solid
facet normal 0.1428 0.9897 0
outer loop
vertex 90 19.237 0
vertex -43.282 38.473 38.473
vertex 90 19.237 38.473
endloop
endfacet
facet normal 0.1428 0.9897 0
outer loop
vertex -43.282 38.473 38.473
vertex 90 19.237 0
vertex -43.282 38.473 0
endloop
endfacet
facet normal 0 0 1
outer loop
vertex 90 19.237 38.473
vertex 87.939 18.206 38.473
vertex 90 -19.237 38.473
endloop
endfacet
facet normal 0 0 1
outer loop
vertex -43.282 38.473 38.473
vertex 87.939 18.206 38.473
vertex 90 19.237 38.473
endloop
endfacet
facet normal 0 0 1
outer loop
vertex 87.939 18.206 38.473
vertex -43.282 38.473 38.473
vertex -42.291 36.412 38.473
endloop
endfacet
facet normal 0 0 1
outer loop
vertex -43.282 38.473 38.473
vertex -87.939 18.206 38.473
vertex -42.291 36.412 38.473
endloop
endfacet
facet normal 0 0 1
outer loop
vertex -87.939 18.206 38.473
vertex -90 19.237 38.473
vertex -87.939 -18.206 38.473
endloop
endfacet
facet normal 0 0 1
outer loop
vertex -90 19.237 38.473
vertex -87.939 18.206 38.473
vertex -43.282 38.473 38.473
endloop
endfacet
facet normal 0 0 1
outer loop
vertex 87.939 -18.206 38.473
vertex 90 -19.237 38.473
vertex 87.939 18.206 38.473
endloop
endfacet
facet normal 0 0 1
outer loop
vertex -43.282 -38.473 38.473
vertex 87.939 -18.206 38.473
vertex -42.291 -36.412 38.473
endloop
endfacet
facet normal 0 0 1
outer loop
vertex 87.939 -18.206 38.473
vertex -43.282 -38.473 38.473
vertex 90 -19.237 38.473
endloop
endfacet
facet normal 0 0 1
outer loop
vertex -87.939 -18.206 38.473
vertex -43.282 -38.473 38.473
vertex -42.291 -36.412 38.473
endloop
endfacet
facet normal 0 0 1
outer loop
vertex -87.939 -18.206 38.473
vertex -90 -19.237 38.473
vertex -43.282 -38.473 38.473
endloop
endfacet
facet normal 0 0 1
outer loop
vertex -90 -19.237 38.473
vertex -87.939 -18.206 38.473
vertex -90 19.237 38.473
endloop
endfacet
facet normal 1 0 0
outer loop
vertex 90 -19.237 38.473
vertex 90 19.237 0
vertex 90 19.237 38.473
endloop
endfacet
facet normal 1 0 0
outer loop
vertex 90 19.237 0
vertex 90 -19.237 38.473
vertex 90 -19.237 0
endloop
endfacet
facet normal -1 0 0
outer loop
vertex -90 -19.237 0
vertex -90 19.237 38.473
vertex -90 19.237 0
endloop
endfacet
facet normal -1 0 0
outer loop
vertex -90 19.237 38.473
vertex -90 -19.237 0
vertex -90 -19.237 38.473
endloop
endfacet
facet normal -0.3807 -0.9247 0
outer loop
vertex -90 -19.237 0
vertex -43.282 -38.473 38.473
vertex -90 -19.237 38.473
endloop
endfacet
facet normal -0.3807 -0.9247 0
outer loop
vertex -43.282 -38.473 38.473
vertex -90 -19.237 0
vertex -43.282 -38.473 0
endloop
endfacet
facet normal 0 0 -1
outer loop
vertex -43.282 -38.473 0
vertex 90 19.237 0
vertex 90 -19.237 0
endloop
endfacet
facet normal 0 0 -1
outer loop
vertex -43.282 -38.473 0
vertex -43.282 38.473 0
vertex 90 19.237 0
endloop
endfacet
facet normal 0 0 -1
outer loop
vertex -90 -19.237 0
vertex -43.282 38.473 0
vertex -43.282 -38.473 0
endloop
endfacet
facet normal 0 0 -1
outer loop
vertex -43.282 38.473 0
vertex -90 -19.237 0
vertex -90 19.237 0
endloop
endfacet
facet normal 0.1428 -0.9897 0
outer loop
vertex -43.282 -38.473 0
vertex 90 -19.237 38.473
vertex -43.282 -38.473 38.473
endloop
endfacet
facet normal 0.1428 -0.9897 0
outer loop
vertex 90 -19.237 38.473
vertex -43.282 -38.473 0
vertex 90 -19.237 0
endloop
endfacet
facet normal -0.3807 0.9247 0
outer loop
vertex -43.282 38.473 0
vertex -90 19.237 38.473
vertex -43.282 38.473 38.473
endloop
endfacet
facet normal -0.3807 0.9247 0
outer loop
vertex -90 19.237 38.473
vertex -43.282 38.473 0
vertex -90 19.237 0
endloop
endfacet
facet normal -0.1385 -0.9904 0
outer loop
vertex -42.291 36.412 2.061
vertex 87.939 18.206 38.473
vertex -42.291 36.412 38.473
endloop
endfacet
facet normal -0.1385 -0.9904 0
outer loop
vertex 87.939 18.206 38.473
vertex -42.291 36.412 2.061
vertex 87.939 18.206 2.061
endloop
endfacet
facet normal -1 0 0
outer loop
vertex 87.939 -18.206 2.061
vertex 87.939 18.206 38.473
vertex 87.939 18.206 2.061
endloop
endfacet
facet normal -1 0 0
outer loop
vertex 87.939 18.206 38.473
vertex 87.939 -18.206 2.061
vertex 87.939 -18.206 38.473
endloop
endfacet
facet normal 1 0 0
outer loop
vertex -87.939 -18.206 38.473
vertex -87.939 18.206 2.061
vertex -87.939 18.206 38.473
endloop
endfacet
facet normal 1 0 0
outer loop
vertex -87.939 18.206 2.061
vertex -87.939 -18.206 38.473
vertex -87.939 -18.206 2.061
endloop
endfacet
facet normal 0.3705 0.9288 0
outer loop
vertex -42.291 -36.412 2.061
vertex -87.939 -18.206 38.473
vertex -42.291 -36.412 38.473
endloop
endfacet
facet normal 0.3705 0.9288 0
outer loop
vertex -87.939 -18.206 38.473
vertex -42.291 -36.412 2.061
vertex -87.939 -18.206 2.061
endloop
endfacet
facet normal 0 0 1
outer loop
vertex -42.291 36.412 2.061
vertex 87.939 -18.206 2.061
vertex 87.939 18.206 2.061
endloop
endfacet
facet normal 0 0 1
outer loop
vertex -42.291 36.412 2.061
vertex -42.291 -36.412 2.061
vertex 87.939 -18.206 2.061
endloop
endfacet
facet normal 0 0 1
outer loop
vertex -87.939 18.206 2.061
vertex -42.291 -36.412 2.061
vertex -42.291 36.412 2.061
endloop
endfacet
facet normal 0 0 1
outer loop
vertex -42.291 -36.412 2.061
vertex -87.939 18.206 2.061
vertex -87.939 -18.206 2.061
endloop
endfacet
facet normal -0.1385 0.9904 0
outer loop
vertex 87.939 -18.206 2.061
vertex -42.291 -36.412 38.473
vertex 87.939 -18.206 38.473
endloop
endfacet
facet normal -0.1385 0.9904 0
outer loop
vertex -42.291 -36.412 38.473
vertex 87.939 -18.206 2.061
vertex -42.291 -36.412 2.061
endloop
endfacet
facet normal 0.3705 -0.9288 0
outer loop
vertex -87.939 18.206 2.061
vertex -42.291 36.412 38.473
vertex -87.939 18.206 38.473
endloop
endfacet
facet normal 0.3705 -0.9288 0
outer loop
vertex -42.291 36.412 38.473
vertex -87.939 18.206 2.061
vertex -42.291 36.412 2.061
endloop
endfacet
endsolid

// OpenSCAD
mm_per_inch=4;
scale_pct=45/65.5;

echo(scale_pct);

board_thick=0.75 * mm_per_inch * scale_pct;

head_w=  14   * mm_per_inch * scale_pct;
head_l=   17   * mm_per_inch * scale_pct;
chest_w= 28    * mm_per_inch * scale_pct;
total_l=   65.5  * mm_per_inch * scale_pct;
foot_w=  14    * mm_per_inch * scale_pct;
height=   14    * mm_per_inch * scale_pct;

echo(head_w/mm_per_inch);
echo(chest_w / mm_per_inch);
echo(total_l/mm_per_inch);
echo(height/mm_per_inch);

module base() {
    linear_extrude(height=height) translate([-total_l/2, 0, 0]) polygon(points=[ [0, head_w/2], [head_l, chest_w/2], [total_l, foot_w/2], [total_l, -foot_w/2], [head_l, -chest_w/2], [0, -head_w/2], [0, head_w/2] ]);
}

difference() {
  base();
  translate([0, 0, board_thick]) scale([1 - board_thick*2 / total_l, 1 - board_thick*2 / chest_w, 1]) base();
};
